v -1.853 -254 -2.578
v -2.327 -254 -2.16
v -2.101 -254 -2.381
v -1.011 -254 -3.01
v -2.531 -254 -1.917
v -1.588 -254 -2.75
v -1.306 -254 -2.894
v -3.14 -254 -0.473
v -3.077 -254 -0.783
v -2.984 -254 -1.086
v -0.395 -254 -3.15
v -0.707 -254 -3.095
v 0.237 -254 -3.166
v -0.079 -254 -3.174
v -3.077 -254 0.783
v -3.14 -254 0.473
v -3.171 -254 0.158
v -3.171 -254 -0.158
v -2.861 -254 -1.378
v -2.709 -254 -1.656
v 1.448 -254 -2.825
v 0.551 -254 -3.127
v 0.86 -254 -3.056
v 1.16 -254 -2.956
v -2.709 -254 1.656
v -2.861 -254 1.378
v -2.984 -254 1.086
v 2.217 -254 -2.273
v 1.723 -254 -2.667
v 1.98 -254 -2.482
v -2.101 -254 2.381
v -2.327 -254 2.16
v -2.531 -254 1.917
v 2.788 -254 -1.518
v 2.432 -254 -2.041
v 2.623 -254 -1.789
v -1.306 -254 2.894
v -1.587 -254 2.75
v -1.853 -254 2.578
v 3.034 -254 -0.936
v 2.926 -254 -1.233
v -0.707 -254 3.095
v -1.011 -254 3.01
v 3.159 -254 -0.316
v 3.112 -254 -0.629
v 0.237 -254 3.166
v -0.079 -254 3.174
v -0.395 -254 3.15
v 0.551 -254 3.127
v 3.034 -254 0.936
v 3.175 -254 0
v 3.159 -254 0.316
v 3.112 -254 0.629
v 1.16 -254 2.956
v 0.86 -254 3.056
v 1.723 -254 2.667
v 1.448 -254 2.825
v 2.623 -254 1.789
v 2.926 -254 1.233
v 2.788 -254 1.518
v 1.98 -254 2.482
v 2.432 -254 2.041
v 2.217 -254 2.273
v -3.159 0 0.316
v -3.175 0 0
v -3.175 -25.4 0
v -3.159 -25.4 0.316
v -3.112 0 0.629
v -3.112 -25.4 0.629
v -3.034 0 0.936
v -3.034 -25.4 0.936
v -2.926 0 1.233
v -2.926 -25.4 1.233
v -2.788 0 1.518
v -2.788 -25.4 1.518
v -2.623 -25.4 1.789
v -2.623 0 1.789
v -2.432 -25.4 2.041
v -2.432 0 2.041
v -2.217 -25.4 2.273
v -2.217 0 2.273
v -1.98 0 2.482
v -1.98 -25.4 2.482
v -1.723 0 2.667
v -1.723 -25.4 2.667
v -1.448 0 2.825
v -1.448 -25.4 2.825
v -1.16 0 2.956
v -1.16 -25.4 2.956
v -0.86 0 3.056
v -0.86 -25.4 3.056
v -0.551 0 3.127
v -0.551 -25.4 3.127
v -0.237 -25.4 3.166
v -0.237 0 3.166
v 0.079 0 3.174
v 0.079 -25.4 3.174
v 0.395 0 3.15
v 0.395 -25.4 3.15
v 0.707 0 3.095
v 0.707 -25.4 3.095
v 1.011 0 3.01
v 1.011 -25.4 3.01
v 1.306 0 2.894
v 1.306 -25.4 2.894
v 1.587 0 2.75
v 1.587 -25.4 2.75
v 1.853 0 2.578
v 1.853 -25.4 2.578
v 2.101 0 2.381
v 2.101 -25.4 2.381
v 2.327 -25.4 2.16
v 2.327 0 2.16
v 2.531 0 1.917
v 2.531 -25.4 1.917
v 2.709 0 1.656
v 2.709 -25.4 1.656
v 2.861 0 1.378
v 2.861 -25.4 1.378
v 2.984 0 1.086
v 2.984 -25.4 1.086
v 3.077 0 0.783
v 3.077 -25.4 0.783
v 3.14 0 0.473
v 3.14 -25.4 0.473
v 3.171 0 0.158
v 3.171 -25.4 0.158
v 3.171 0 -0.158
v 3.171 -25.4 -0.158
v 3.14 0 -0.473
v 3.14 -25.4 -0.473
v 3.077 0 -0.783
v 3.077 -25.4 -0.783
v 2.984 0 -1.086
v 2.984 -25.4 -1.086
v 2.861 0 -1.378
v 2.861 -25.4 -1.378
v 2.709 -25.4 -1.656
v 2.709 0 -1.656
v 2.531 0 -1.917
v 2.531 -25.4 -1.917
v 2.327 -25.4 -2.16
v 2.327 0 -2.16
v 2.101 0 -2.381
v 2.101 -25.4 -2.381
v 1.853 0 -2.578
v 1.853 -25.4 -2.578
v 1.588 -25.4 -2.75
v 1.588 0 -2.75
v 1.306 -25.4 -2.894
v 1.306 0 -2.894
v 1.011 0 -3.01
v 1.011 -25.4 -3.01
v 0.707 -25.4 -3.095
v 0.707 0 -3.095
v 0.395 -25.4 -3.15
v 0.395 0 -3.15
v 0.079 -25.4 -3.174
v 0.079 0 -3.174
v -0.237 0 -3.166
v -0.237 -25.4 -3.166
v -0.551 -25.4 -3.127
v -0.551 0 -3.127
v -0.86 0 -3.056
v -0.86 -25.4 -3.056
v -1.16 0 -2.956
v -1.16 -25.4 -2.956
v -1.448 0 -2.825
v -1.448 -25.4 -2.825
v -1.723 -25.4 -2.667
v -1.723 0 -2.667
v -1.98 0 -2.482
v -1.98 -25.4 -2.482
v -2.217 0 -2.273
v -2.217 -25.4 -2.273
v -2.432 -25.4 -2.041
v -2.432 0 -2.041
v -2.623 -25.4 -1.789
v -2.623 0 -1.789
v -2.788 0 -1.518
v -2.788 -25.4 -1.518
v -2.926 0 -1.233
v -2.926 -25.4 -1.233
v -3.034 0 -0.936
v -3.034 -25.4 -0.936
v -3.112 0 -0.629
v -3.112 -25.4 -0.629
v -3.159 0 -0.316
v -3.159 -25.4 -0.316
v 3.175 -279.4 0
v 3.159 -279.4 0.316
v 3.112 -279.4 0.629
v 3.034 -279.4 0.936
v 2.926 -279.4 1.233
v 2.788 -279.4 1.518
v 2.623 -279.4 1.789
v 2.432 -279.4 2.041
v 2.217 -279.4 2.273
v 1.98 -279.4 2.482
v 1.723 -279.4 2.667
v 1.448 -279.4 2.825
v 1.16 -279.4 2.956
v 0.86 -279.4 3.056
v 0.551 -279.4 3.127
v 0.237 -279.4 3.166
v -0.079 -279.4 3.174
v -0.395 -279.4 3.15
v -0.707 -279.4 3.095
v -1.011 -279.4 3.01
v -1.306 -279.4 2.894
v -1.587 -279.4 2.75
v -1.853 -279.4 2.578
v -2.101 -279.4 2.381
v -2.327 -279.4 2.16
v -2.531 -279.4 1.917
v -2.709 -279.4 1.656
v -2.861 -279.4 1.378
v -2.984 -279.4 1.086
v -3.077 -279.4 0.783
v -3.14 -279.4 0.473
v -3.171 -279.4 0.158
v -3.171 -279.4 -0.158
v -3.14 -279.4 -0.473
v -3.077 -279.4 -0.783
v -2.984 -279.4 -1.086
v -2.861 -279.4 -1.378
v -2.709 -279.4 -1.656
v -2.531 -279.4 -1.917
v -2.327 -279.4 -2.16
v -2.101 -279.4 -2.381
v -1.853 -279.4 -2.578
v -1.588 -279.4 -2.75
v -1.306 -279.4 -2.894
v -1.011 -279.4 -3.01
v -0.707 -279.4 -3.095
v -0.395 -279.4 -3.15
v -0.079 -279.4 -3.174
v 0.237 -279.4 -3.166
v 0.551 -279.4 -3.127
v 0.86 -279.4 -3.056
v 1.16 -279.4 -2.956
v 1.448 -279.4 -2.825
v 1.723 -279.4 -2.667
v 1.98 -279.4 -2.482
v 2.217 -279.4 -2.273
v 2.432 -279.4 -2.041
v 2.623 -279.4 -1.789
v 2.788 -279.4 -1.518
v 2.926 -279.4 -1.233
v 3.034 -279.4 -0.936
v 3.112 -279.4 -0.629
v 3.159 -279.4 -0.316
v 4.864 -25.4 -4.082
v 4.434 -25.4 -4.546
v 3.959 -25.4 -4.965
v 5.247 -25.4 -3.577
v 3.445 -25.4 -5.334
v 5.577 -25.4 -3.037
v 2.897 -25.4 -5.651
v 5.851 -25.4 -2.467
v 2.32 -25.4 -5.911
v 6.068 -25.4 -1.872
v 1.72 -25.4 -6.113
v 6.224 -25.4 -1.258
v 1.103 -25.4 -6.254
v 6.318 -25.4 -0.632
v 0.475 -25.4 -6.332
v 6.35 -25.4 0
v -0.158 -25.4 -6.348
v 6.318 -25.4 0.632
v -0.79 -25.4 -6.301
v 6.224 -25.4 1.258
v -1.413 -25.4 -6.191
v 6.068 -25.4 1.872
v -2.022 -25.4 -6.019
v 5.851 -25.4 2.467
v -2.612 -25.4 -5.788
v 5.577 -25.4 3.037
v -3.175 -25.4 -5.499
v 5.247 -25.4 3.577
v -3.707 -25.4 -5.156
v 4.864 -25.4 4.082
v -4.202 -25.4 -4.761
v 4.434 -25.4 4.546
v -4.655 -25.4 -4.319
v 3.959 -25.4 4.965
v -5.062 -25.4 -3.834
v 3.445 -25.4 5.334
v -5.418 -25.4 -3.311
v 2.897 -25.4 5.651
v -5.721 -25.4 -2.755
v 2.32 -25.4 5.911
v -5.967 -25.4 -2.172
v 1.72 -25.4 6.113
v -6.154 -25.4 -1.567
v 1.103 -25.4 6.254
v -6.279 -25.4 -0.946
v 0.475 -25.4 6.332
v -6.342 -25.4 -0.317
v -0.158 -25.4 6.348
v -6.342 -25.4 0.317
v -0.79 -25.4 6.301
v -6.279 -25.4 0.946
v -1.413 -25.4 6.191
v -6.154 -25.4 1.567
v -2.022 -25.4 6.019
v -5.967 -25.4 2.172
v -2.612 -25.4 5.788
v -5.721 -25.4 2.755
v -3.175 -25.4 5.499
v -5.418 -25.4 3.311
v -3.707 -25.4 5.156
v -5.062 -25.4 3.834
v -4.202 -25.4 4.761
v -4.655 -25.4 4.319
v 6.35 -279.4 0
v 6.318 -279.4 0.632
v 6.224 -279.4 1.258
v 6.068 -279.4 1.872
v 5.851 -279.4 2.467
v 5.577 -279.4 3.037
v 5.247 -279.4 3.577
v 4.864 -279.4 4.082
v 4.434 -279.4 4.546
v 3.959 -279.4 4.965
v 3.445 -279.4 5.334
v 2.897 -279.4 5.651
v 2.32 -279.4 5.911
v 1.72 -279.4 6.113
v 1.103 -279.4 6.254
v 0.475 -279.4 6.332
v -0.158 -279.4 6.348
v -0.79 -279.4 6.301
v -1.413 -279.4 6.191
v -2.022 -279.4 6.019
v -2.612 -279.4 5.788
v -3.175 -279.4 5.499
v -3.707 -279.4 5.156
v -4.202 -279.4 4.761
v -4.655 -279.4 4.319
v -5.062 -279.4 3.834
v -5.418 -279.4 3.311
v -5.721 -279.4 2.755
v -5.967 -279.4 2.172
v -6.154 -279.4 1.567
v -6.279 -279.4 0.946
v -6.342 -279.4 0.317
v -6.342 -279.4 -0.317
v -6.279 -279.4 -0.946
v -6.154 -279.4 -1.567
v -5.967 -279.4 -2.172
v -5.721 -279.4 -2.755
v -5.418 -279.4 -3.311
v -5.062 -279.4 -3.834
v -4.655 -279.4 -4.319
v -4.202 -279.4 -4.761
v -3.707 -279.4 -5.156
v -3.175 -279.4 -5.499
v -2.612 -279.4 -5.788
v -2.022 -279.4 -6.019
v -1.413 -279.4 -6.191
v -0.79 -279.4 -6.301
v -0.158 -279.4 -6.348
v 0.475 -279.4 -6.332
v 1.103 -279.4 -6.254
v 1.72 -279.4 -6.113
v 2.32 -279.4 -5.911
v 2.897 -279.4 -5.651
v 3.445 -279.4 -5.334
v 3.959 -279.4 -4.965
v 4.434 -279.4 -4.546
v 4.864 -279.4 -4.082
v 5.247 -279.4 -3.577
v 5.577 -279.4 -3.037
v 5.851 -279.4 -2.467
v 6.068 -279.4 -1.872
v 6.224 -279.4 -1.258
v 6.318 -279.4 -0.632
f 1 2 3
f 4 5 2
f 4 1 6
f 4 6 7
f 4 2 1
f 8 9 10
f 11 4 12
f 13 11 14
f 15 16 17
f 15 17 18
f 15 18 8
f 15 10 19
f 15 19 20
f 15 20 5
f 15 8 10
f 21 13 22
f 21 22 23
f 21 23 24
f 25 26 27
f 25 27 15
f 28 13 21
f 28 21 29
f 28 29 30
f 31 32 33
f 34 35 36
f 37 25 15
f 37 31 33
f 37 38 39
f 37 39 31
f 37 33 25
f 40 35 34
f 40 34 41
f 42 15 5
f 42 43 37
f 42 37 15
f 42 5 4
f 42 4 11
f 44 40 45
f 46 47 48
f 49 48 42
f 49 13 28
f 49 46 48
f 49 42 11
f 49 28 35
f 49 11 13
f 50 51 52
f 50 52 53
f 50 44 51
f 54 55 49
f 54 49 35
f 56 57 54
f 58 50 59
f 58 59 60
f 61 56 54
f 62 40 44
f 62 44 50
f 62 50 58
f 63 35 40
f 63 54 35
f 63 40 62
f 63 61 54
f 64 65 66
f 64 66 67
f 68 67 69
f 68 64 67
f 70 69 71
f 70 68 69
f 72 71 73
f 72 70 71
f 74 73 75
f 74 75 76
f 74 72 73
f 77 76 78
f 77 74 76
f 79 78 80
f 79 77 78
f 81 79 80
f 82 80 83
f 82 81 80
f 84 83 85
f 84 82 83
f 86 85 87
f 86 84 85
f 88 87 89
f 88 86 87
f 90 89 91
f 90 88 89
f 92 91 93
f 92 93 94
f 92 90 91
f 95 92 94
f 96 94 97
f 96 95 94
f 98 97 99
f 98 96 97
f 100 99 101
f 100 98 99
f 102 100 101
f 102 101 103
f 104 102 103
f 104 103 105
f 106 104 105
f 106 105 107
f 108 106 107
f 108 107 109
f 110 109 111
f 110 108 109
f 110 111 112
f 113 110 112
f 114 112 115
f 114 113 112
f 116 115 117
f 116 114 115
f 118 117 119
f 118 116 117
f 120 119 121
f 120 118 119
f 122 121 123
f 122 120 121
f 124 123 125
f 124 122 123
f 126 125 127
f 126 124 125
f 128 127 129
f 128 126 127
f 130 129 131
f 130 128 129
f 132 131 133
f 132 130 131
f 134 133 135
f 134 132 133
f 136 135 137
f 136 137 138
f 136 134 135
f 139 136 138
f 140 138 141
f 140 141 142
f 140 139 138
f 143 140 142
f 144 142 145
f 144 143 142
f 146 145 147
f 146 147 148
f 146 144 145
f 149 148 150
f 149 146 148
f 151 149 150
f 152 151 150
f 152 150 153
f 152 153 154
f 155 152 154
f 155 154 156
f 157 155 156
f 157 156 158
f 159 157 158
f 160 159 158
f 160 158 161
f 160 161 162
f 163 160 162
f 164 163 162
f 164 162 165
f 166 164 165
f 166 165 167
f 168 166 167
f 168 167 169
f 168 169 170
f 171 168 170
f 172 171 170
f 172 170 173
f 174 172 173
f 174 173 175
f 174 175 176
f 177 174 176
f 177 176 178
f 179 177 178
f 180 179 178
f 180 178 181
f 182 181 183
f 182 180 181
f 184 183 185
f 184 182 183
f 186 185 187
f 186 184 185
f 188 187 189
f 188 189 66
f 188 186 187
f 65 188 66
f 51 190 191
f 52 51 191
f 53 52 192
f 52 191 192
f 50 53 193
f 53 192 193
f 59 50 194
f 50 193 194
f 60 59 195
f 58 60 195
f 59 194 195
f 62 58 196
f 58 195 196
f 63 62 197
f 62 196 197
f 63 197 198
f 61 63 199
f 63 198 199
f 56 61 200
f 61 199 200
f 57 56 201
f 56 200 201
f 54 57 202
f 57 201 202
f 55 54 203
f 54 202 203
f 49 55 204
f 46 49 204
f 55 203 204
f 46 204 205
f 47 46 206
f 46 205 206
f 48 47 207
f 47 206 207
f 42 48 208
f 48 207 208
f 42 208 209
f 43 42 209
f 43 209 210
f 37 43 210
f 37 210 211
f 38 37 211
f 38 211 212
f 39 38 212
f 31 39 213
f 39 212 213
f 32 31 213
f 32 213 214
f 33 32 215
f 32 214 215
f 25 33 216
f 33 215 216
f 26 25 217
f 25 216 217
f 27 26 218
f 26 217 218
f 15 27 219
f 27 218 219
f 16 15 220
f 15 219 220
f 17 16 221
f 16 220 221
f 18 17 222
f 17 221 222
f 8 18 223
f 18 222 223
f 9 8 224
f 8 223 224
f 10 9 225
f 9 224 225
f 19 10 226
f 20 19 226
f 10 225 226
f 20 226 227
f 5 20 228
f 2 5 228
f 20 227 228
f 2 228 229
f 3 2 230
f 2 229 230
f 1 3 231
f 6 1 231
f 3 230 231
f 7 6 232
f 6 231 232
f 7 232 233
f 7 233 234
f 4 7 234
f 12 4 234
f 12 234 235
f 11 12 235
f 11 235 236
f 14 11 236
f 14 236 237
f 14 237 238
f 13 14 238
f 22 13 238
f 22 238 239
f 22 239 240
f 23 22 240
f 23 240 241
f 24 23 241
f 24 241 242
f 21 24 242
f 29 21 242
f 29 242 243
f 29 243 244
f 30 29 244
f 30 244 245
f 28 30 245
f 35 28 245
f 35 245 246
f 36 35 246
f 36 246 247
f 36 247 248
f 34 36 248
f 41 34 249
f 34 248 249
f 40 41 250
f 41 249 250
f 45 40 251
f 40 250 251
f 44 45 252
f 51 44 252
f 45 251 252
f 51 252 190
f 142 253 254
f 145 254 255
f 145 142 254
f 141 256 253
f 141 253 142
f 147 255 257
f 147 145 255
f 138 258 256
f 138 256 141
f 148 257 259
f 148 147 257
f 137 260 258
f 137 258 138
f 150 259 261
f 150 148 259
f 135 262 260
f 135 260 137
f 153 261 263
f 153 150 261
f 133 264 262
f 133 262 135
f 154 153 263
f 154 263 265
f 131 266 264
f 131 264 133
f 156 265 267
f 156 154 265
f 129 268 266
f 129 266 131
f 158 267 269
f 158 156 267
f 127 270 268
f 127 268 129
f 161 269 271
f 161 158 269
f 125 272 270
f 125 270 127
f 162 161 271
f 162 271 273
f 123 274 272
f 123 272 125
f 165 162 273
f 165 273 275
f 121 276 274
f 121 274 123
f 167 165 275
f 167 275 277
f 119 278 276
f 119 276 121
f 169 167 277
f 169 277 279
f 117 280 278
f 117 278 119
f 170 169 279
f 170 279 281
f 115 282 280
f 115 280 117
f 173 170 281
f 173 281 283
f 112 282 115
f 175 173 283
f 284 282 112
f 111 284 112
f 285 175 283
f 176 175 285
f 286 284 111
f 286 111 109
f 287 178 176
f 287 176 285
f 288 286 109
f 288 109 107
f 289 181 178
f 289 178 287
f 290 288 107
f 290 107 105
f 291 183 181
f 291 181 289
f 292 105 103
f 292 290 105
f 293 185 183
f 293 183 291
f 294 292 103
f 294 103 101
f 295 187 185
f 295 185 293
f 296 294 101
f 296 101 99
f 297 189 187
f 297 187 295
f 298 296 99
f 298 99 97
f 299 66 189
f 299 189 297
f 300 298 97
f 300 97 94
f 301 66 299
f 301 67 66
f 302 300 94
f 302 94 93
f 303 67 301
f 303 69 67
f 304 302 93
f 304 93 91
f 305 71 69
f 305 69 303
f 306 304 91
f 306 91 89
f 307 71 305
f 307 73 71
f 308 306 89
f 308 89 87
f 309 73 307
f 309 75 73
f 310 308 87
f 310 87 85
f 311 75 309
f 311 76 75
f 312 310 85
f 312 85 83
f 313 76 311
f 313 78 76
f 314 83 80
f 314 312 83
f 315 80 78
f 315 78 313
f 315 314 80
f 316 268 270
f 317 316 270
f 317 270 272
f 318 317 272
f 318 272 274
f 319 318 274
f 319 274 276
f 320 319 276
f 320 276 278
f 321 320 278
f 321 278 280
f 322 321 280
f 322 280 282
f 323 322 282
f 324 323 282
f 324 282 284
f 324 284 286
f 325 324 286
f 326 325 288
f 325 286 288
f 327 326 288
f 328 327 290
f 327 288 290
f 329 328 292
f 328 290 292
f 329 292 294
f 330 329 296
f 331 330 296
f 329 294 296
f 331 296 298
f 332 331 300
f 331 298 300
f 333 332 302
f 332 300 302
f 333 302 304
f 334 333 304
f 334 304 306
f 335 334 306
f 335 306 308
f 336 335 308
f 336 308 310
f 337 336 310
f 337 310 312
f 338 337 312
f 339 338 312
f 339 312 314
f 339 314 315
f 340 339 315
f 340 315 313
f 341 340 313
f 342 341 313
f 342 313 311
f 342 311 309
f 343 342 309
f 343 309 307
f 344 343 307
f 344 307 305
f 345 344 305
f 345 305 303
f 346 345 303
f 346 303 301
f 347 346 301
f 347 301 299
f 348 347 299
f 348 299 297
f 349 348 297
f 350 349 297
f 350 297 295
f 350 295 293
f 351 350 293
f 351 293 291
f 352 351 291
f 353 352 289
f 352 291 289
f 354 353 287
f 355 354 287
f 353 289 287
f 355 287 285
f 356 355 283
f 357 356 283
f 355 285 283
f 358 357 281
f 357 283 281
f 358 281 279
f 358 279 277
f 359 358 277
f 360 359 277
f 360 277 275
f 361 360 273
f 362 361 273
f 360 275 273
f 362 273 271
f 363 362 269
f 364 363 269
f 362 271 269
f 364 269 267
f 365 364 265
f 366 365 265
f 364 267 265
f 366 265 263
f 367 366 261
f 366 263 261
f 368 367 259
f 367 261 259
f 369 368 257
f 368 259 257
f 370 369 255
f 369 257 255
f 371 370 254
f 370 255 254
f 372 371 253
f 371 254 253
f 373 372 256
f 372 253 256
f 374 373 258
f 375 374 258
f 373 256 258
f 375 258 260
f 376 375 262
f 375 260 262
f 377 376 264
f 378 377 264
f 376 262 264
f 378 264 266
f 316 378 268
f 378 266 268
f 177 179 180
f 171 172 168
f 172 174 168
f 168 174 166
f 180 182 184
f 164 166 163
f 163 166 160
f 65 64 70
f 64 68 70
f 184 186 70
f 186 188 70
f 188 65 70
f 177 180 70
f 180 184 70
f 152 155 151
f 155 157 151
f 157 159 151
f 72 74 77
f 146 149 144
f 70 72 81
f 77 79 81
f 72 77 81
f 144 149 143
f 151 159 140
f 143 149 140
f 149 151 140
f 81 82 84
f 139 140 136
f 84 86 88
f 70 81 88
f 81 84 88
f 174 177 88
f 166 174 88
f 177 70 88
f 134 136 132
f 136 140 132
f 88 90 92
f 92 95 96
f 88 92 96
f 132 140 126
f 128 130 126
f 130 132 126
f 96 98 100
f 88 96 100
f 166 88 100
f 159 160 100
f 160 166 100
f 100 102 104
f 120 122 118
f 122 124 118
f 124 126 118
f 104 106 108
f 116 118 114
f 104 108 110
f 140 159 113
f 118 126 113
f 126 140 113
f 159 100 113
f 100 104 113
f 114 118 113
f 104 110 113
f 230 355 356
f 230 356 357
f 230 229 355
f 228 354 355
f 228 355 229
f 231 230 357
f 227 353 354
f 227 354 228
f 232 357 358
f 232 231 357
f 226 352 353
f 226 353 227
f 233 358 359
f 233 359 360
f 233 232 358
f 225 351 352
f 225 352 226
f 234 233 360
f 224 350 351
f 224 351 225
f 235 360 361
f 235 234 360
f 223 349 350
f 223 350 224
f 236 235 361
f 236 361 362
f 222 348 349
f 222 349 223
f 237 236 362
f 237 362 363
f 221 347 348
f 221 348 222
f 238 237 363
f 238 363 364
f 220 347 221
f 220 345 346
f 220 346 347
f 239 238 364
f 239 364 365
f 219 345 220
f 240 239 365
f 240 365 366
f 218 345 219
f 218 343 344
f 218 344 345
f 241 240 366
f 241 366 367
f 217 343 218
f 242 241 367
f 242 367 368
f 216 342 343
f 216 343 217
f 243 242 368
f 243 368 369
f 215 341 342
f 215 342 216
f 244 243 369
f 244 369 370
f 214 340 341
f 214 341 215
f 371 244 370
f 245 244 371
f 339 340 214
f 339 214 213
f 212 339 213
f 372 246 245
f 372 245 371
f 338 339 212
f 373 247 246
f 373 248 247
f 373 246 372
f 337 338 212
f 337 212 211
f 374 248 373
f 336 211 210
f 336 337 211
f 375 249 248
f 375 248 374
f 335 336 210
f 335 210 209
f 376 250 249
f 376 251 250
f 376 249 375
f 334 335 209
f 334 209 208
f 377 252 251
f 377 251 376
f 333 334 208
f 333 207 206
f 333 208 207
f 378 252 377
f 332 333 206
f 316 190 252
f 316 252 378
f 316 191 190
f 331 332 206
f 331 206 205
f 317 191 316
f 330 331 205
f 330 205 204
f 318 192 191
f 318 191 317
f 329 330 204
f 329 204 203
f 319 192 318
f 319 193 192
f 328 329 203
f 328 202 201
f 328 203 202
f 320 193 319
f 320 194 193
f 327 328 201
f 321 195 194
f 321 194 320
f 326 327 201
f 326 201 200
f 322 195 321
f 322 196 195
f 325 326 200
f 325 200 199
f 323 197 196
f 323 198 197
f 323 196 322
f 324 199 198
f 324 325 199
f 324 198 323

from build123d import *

# Parameters (mm, degrees)
F0_R     = 6.35
F1_DEPTH = 279.4
F2_R     = 6.35
F2_R_2   = 3.175
F3_DEPTH = 25.4
F4_R     = 3.175
F5_DEPTH = 25.4


with BuildPart() as f1:
    # F0 (on Front) → F1 (new body)
    with BuildSketch(Plane.XZ):
        Circle(F0_R)
    extrude(amount=F1_DEPTH)

    # F2 (on face) → F3 (cut)
    with BuildSketch(Plane(origin=(0, 0, 0), x_dir=(-1, 0, 0), z_dir=(0, 1, 0))):
        Circle(F2_R)
        Circle(F2_R_2, mode=Mode.SUBTRACT)
    extrude(amount=-F3_DEPTH, mode=Mode.SUBTRACT)

    # F4 (on face) → F5 (cut)
    with BuildSketch(Plane.XZ.offset(279.4)):
        Circle(F4_R)
    extrude(amount=-F5_DEPTH, mode=Mode.SUBTRACT)


solid = f1.part
